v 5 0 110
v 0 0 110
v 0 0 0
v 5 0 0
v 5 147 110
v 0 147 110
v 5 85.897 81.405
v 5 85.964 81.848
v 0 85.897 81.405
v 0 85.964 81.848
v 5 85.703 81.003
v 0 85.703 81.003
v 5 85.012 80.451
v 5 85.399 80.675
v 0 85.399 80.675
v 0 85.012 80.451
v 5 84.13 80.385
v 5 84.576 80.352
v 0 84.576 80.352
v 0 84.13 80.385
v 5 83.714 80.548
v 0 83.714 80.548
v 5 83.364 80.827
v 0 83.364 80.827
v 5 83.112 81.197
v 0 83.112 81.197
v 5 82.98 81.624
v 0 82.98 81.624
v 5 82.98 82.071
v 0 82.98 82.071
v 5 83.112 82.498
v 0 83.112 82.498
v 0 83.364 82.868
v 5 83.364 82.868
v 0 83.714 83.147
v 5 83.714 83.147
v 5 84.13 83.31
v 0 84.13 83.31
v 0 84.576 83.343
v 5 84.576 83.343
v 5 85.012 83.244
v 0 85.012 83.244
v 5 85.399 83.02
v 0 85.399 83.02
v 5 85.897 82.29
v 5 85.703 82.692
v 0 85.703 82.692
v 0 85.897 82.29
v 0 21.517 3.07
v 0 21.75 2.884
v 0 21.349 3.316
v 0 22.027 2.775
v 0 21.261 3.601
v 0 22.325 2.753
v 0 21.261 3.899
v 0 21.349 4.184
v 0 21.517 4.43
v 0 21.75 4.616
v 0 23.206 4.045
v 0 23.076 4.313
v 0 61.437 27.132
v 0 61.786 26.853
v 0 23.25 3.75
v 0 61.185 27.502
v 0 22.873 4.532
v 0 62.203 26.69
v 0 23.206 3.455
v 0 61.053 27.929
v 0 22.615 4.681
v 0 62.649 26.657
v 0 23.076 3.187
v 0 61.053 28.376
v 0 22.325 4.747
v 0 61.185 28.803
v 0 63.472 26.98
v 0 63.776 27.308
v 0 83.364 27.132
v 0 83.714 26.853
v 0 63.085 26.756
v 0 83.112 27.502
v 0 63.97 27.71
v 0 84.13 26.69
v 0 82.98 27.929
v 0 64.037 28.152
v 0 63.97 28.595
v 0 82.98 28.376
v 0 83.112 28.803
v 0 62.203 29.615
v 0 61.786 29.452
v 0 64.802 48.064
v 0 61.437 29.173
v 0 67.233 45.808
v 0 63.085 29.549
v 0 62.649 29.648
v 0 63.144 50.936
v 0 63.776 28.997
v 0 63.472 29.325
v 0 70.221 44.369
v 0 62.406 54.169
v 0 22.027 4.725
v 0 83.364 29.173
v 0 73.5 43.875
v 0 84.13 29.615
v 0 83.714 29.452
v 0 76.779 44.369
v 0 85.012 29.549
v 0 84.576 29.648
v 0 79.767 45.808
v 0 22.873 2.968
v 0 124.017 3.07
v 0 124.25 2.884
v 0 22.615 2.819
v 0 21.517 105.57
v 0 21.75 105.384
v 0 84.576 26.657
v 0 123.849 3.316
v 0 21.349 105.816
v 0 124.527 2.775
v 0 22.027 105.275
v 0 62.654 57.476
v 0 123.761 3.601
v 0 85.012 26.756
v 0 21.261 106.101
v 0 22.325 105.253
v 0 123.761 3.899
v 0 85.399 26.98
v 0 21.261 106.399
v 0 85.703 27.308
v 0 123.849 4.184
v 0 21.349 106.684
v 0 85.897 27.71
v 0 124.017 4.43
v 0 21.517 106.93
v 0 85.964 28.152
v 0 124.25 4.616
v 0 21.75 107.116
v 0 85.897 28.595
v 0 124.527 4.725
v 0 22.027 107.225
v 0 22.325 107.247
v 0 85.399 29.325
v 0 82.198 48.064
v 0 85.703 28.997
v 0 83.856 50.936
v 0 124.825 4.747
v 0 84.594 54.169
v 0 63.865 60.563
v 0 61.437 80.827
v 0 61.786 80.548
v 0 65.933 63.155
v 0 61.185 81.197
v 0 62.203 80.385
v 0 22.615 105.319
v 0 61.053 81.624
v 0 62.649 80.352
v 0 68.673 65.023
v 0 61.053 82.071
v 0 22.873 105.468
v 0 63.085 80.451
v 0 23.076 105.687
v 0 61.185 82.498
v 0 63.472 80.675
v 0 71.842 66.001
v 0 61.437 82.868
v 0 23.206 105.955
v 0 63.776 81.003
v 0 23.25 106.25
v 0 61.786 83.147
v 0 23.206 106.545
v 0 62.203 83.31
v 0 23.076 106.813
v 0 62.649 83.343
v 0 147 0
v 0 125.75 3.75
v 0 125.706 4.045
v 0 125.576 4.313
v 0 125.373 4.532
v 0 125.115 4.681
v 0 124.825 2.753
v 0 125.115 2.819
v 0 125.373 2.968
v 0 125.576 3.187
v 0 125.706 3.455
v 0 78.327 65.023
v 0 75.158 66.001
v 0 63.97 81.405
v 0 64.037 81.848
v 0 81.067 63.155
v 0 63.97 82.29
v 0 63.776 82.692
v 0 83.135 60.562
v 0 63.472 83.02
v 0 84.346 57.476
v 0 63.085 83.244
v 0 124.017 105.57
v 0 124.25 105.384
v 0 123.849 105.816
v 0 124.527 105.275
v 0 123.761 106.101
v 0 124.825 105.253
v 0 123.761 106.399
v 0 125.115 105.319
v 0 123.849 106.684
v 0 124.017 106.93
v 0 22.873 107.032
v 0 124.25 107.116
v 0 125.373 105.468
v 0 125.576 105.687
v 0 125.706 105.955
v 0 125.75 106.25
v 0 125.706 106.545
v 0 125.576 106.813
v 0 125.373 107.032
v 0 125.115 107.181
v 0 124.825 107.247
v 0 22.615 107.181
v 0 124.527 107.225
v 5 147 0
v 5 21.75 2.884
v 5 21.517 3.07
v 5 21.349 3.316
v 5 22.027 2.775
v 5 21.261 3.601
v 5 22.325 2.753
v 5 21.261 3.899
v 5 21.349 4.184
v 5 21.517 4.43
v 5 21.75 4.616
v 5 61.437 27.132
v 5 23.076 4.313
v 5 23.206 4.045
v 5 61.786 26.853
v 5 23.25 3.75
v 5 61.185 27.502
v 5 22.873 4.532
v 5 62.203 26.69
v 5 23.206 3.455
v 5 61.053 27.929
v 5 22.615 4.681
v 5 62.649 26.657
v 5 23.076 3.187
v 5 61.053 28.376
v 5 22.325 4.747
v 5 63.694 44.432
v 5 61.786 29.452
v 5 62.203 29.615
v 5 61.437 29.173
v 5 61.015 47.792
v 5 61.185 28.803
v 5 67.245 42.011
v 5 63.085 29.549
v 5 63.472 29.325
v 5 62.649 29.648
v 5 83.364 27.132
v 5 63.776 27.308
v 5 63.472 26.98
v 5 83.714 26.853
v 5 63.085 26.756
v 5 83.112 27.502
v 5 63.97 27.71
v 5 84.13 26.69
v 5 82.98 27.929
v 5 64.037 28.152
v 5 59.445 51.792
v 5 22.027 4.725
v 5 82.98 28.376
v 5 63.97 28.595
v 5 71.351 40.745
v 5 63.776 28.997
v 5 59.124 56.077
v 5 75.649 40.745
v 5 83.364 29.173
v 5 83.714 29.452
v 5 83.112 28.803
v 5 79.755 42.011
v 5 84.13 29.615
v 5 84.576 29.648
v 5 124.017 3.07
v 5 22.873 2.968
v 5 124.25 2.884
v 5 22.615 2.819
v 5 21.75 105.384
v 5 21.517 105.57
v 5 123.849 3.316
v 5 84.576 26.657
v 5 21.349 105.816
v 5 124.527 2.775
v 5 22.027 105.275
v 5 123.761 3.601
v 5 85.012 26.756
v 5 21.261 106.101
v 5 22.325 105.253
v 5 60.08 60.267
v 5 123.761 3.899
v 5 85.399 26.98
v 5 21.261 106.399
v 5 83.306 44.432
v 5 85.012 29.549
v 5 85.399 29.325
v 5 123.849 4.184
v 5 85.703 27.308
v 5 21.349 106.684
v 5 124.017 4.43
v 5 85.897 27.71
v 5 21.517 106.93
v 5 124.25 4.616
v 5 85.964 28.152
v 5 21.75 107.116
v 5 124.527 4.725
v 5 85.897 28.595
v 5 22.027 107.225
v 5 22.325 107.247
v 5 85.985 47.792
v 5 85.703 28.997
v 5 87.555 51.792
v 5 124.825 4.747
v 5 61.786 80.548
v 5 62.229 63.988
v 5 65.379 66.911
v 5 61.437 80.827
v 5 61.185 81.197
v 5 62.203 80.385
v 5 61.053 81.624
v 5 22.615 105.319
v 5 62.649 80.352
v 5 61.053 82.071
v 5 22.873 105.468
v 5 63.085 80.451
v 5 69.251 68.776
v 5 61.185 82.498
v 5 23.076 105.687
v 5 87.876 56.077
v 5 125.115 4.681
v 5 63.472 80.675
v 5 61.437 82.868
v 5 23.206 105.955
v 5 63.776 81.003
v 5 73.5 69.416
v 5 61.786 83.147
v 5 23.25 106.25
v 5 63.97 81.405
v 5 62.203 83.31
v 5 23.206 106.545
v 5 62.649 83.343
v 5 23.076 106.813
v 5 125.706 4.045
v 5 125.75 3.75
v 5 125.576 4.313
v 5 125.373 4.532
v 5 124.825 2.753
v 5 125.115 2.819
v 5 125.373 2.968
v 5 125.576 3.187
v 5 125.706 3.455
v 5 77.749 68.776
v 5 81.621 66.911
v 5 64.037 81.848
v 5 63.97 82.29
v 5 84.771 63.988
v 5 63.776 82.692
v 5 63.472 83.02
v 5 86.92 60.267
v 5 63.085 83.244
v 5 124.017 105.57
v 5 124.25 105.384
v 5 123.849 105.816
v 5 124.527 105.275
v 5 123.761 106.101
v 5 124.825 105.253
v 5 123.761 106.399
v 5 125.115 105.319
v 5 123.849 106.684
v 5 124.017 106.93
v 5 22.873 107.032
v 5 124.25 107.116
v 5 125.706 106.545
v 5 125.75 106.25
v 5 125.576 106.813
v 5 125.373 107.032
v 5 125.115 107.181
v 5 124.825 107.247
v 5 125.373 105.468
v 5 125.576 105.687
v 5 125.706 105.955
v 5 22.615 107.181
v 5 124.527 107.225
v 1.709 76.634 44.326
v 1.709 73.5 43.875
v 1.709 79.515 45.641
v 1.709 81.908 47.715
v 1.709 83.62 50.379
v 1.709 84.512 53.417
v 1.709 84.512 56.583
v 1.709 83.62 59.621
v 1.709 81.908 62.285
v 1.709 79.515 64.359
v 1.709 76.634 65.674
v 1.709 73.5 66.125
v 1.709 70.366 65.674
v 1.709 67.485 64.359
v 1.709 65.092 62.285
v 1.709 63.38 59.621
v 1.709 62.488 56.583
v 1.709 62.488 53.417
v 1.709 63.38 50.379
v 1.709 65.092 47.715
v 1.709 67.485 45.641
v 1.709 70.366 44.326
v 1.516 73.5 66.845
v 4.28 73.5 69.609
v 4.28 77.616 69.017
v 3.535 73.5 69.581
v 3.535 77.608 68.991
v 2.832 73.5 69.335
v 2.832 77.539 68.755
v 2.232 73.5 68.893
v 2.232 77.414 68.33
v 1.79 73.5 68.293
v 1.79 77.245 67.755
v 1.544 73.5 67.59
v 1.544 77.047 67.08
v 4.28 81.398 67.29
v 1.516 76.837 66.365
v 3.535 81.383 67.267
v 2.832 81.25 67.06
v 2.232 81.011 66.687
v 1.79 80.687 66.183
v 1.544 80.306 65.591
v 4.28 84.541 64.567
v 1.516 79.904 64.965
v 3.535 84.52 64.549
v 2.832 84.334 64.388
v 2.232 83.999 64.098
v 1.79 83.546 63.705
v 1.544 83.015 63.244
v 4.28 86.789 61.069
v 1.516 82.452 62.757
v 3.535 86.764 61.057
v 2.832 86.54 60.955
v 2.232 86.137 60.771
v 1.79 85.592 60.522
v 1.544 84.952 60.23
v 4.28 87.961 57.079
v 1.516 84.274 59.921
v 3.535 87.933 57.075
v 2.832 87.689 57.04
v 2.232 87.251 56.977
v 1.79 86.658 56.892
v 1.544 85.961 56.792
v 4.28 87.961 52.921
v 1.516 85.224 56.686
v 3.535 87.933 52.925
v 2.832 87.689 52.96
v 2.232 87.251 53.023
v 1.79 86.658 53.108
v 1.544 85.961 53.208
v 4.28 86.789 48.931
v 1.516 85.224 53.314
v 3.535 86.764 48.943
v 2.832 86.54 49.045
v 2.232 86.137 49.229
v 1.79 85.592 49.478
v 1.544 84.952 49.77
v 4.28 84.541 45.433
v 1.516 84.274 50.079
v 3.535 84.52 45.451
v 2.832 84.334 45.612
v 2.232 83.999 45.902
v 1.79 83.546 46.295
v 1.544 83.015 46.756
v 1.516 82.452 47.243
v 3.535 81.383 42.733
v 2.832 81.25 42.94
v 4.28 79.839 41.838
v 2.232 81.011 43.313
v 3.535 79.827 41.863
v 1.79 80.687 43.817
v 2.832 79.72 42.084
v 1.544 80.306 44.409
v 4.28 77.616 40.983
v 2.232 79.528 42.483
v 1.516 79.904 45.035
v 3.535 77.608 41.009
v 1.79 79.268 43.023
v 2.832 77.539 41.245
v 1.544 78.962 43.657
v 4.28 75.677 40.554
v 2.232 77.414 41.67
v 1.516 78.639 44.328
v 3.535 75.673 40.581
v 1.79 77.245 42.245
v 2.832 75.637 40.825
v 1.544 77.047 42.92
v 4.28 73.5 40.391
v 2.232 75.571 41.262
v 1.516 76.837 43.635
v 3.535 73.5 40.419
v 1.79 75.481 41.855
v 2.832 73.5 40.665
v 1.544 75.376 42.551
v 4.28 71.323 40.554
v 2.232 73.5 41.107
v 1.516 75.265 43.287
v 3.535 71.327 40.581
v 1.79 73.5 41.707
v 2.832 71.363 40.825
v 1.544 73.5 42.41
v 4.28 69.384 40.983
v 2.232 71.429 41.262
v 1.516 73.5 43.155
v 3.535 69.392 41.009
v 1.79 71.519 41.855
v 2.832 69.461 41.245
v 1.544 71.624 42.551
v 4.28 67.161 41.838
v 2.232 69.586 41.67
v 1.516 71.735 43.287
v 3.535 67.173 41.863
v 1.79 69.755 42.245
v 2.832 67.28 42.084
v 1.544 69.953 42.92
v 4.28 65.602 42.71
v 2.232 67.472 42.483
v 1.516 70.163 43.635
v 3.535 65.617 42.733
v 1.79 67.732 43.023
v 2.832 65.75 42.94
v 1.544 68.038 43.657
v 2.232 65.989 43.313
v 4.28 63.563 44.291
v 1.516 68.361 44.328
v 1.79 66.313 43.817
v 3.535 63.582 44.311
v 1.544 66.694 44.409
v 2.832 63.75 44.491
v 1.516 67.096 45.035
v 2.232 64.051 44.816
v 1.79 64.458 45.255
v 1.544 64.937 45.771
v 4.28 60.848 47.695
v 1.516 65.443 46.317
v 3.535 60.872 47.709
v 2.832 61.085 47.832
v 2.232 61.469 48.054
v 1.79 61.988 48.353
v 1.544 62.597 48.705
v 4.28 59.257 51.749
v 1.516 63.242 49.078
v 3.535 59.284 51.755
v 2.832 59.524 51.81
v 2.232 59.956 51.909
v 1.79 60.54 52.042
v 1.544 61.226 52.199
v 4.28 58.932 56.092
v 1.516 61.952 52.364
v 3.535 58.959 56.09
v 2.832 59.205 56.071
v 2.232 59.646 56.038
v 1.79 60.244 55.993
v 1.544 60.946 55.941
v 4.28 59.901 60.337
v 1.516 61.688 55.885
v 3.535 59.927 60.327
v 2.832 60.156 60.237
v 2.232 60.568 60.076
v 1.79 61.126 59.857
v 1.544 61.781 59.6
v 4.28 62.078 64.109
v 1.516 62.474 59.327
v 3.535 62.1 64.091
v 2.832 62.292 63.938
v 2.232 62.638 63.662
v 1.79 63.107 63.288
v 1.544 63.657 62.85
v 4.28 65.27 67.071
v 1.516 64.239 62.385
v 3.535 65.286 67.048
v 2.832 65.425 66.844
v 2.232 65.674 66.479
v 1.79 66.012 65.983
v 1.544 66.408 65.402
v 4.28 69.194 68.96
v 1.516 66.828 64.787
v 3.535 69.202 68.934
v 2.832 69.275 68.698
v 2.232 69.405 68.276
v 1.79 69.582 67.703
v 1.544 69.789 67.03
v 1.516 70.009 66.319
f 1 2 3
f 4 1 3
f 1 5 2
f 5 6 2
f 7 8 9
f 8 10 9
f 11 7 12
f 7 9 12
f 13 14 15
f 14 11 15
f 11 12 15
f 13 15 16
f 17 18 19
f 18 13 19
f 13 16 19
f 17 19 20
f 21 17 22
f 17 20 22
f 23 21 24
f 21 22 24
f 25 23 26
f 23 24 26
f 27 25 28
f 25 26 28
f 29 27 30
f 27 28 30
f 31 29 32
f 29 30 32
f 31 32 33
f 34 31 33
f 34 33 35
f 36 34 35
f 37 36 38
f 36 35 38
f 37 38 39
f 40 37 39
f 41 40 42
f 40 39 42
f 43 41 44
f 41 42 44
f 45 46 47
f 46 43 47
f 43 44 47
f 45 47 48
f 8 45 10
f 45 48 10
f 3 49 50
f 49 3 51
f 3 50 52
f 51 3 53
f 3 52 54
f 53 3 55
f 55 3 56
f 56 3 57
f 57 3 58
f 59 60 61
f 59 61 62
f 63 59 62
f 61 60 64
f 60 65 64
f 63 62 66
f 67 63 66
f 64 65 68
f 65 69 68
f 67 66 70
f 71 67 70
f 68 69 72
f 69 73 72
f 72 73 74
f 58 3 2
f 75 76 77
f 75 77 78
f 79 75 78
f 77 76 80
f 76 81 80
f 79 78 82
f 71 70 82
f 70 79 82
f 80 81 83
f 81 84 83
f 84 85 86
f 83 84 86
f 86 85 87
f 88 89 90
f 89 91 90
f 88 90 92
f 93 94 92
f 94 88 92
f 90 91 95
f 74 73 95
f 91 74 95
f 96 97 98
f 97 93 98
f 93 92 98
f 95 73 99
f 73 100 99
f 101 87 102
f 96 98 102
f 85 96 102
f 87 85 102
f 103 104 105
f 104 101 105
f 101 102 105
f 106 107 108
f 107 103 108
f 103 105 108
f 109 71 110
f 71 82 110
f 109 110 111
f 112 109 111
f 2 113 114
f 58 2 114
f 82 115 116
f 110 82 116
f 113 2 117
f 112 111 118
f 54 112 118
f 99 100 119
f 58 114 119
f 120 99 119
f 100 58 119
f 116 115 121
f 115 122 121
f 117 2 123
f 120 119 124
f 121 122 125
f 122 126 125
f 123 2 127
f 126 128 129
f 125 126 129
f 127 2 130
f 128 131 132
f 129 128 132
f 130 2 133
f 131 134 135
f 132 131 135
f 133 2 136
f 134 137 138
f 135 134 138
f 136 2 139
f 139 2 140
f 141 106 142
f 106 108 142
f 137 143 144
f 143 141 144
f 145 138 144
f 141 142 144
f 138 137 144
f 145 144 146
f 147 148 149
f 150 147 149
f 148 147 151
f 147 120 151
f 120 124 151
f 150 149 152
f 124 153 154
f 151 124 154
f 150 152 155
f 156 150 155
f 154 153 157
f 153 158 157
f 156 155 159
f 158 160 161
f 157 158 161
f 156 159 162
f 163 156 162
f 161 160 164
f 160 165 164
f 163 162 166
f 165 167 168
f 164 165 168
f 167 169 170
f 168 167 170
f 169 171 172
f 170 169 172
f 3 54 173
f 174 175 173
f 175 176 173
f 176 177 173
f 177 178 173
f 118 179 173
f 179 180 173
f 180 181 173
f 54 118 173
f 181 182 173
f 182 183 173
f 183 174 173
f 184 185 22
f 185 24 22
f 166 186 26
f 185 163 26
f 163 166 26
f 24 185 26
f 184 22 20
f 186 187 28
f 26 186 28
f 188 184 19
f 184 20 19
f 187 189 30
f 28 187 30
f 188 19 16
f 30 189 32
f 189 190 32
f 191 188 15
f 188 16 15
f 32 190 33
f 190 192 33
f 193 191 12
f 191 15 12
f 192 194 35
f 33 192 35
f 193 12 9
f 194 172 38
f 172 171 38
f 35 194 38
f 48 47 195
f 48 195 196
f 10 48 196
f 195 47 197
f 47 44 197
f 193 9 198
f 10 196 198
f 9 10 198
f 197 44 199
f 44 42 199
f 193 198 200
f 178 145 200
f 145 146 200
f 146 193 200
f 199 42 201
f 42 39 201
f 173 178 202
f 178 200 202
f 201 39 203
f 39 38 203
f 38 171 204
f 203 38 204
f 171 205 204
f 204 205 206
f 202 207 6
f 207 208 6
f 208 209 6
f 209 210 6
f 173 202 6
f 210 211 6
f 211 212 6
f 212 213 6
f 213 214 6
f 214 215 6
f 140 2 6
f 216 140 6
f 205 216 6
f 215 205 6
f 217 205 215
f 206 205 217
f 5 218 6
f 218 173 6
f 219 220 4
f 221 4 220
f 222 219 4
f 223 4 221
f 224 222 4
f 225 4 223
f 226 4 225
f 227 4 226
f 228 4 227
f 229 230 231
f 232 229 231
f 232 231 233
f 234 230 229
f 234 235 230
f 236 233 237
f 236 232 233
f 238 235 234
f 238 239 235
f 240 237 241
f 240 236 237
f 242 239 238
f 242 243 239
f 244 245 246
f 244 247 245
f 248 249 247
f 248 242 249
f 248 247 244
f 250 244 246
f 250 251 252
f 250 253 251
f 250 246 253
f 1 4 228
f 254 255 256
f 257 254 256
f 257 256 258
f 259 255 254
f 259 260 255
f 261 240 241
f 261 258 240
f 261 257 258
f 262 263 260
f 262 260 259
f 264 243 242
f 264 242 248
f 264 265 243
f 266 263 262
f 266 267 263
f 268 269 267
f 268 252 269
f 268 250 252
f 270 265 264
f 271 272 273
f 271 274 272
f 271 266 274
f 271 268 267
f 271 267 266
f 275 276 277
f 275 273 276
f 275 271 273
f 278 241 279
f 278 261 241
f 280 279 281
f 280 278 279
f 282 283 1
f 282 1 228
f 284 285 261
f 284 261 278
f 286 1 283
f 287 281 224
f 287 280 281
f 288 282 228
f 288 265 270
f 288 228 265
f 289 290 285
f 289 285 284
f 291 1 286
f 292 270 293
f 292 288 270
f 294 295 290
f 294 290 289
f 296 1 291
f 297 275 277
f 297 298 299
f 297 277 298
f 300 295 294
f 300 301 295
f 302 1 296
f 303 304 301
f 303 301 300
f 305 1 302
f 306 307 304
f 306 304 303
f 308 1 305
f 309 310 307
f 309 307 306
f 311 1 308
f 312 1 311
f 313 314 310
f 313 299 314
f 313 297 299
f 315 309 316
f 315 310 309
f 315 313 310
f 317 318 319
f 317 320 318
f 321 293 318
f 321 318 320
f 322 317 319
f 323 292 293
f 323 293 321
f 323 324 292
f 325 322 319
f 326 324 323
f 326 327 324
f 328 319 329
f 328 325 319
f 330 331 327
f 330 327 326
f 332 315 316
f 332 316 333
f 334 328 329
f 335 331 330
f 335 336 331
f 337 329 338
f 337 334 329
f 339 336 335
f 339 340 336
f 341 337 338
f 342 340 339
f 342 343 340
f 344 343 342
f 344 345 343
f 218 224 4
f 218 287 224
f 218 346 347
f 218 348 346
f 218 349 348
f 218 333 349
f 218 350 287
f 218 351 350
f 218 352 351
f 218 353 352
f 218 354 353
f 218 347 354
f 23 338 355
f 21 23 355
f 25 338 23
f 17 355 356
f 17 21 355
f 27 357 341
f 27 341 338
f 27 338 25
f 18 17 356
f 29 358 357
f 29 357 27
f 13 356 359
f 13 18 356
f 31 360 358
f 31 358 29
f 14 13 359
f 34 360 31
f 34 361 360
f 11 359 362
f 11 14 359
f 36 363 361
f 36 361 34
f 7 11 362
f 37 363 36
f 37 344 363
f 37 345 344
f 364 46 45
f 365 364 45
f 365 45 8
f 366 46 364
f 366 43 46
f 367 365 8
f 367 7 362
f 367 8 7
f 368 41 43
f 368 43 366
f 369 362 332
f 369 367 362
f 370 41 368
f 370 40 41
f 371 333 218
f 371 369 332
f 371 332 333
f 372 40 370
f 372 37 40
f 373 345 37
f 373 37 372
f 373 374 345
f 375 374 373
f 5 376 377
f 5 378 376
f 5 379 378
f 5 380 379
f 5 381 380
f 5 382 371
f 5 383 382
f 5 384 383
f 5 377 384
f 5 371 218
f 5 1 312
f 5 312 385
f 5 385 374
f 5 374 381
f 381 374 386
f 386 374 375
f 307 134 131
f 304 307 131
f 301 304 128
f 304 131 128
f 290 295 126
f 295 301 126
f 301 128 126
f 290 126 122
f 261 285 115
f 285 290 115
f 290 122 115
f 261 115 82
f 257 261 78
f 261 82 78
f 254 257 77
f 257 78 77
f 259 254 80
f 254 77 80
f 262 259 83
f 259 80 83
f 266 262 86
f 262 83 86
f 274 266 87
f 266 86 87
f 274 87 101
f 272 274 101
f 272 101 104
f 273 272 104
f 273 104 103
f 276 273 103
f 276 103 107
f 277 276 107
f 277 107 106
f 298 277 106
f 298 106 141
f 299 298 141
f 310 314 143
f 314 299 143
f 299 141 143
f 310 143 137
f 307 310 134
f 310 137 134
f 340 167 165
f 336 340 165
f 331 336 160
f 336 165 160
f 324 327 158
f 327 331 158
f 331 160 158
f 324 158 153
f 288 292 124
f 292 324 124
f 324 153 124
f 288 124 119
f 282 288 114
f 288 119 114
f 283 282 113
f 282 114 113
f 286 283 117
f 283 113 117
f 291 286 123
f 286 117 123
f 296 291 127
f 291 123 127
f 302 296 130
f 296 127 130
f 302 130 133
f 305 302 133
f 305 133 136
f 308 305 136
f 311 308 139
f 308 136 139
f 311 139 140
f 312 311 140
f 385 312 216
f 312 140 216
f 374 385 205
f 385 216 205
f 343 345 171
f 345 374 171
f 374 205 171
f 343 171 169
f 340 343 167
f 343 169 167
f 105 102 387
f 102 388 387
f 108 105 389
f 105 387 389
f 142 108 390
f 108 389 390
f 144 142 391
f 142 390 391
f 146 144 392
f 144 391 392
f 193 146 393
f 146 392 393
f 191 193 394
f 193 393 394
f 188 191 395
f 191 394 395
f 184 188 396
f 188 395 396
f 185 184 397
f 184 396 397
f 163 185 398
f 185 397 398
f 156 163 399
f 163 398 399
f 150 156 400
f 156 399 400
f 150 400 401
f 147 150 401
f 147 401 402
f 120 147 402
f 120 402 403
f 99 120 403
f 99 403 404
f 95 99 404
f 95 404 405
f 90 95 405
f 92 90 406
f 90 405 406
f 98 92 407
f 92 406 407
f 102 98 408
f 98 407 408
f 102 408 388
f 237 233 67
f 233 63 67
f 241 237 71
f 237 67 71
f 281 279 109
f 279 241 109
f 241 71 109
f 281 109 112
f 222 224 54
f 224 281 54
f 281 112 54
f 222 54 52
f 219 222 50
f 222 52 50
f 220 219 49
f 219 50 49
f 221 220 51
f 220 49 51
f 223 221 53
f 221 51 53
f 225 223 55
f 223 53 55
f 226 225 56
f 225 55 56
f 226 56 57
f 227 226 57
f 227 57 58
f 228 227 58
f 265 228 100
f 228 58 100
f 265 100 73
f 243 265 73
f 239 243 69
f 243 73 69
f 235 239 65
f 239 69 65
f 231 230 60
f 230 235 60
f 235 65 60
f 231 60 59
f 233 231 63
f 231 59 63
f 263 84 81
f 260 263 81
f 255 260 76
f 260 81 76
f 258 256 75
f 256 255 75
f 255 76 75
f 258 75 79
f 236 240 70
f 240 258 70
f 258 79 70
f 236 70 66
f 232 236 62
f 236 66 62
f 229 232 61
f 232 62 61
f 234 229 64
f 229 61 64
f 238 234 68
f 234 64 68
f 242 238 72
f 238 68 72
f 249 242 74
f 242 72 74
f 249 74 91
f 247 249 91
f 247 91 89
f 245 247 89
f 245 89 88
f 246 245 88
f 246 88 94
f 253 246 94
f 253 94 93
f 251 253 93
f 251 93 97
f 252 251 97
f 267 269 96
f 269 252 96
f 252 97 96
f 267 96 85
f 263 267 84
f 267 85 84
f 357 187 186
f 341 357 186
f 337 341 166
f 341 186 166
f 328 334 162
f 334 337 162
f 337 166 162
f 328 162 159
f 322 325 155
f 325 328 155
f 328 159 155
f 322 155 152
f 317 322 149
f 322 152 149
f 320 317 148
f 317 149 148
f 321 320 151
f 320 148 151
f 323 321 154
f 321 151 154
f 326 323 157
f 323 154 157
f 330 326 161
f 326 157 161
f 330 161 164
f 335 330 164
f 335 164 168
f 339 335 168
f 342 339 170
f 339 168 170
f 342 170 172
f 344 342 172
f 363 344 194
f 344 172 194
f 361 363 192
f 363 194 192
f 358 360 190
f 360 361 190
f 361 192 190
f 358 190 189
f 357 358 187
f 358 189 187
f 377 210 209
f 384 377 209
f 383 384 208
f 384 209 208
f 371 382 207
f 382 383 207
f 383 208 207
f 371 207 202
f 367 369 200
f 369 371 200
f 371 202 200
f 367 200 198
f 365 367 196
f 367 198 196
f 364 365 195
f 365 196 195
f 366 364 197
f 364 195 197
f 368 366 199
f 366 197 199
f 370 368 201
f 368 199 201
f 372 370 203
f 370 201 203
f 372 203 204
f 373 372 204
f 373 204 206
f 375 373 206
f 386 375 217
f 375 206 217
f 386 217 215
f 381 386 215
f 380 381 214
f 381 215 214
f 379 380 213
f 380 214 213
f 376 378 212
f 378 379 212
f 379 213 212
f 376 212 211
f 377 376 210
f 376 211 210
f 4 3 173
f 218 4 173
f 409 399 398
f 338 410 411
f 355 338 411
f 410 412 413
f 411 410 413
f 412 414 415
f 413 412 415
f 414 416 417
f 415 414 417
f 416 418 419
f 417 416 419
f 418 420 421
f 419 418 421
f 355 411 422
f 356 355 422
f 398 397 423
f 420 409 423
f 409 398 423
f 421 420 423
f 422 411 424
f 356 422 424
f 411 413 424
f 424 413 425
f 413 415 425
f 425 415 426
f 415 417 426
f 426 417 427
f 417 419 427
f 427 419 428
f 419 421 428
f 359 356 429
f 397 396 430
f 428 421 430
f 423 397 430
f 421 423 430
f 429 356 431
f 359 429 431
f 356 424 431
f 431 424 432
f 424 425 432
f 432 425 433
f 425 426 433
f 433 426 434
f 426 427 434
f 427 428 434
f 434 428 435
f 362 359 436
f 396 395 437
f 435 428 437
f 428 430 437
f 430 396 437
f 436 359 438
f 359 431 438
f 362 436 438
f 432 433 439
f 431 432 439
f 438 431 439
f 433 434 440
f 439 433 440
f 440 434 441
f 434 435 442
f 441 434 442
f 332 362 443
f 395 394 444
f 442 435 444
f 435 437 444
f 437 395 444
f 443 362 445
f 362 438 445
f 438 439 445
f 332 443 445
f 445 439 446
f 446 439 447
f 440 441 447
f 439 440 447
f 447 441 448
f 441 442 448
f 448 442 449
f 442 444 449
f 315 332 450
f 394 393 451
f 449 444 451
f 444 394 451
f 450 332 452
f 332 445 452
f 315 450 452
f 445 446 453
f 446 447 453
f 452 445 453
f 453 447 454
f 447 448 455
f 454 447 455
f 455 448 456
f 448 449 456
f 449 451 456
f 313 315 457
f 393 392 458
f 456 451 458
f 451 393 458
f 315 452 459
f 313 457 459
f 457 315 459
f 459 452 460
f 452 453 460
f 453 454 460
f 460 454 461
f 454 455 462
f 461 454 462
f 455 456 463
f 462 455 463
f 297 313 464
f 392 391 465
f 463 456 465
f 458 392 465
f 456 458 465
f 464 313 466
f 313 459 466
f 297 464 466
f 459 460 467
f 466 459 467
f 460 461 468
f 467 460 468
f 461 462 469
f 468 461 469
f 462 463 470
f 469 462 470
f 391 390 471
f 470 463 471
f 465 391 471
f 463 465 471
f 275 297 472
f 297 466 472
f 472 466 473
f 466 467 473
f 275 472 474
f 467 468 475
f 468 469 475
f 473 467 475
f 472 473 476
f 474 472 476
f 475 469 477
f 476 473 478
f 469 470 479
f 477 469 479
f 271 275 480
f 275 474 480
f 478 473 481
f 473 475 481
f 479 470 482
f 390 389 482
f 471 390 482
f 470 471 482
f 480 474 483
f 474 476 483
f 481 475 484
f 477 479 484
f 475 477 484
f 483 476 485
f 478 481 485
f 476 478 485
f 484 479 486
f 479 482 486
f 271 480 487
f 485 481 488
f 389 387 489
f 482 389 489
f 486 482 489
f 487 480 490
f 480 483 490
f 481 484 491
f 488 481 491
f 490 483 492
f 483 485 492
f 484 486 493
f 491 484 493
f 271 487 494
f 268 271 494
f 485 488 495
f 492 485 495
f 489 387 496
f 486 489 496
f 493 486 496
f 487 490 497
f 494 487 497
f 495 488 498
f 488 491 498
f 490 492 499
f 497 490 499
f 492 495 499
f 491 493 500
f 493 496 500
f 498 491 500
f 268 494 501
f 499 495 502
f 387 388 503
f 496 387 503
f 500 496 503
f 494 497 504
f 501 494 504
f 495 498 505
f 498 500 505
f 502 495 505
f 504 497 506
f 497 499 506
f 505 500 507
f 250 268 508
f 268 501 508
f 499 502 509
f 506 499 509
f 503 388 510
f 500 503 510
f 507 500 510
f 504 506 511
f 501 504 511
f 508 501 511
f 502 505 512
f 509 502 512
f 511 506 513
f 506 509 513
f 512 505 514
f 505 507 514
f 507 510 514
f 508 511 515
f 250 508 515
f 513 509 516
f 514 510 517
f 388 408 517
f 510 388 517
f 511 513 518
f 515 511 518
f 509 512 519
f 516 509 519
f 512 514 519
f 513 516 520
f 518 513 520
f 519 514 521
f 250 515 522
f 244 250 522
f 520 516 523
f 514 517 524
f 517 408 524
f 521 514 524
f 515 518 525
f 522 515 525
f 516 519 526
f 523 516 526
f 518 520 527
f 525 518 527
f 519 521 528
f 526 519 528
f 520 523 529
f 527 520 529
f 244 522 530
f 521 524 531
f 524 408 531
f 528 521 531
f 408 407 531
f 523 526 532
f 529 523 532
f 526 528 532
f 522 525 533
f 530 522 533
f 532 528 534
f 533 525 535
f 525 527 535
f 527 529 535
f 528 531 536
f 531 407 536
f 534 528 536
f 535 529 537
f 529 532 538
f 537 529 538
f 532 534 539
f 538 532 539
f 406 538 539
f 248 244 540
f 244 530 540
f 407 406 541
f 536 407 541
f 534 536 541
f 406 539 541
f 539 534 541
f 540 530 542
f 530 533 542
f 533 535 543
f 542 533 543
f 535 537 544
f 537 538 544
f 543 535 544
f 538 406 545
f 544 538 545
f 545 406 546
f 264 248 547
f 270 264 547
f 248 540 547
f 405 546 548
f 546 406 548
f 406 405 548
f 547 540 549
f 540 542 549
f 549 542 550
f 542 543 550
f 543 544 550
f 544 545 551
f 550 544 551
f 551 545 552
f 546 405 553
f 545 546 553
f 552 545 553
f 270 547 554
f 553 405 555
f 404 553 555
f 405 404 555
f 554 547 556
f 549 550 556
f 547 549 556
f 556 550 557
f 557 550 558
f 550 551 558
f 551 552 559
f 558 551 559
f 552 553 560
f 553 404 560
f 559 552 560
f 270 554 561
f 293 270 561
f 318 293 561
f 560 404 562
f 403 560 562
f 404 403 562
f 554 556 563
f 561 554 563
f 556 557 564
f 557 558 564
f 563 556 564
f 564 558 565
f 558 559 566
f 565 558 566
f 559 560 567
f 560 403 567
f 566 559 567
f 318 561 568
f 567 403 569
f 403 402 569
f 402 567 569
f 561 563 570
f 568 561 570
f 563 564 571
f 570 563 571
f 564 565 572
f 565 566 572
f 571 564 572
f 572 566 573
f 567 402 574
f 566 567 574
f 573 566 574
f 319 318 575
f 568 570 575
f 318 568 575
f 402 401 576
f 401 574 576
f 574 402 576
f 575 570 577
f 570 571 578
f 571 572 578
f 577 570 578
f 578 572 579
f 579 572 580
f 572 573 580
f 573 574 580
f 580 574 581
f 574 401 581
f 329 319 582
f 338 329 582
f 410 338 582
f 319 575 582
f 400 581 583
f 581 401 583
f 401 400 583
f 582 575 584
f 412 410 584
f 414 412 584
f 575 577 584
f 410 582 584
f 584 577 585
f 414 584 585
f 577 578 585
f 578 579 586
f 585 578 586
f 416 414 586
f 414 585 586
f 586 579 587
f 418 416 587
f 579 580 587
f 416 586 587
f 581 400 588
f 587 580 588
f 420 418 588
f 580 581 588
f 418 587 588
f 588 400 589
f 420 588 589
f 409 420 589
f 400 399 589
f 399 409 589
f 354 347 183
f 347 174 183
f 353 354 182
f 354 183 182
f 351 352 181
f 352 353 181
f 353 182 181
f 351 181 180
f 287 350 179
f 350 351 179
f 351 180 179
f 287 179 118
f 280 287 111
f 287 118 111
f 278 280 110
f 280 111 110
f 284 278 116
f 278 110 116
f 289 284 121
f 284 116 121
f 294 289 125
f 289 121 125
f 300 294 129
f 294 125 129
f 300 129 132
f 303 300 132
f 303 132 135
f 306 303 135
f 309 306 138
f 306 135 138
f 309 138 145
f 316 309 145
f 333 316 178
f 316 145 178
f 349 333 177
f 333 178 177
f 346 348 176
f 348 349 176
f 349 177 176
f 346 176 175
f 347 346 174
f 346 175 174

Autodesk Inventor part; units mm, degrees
ref_plane "YZ Plane" through (0, 0, 0) normal (1, 0, 0) x (0, 1, 0)
ref_plane "XZ Plane" through (0, 0, 0) normal (0, 1, 0) x (-1, 0, 0)
ref_plane "XY Plane" through (0, 0, 0) normal (0, 0, 1) x (1, 0, 0)
sketch "Sketch1" plane through (0, 0, 0) normal (1, 0, 0) x (0, 1, 0)
  line L0 (0, 0) -> (147, 0)
  line L1 (147, 0) -> (147, 110)
  line L2 (147, 110) -> (0, 110)
  line L3 (0, 110) -> (0, 0)
  circle A0 centre (124.75, 106.25) radius 1
  circle A1 centre (124.75, 3.75) radius 1
  circle A2 centre (22.25, 3.75) radius 1
  circle A3 centre (22.25, 106.25) radius 1
  circle A4 centre (84.4635, 28.1525) radius 1.5
  circle A5 centre (84.4635, 81.8475) radius 1.5
  circle A6 centre (62.5365, 81.8475) radius 1.5
  circle A7 centre (62.5365, 28.1525) radius 1.5
  dimension "d0" = 102.5
  dimension "d1" = 102.5
  dimension "d2" = 2
  dimension "d3" = 110
  dimension "d4" = 147
  dimension "d5" = 22.25
  dimension "d6" = 22.25
  dimension "d7" = 3.75
  dimension "d8" = 3.75
  dimension "d24" = 3
  dimension "d25" = 3
  dimension "d26" = 3
  dimension "d27" = 3
  dimension "d28" = 53.695
  dimension "d29" = 21.927
  dimension "d30" = 28.1525
  dimension "d31" = 28.1525
  dimension "d32" = 62.5365
  dimension "d33" = 62.5365
extrude "Extrusion1" add sketch "Sketch1" along normal blind 5
sketch "Sketch2" plane through (5, 0, 0) normal (1, 0, 0) x (0, 0, -1)
  circle A0 centre (-55, 73.5) radius 11.125
  line L0 (-110, 0) -> (0, 0) projected
  line L1 (-110, 147) -> (-110, 0) projected
  point P0 (-55, 0)
  point P1 (-110, 73.5)
  dimension "d11" = 22.25
extrude "Extrusion2" cut sketch "Sketch2" against normal up to surface (5 mm away)
ref_plane "Work Plane1" through (0, 73.5, 0) normal (0, -1, 0) x (1, 0, 0)
sketch "Sketch3" plane through (0, 73.5, 0) normal (0, -1, 0) x (1, 0, 0)
  line L0 (5, 66.125) -> (5, 43.875) projected
  line L1 (0, 55) -> (5, 55) construction
  line L2 (0, 43.875) -> (0, 66.125) projected
  circle A0 centre (4, 67.125) radius 2.5
  point P0 (0, 0)
  dimension "d17" = 5
  dimension "d22" = 1
  dimension "d23" = 1
revolve "Revolution1" cut sketch "Sketch3" angle 360 about axis through (0, 73.5, 55) along (1, 0, 0)
equation "\"d1\" = d0"
equation "\"d5\" = d6"
equation "\"d7\" = d8"
equation "\"d30\" = d31"
equation "\"d32\" = d33"
properties part number "front plate"
